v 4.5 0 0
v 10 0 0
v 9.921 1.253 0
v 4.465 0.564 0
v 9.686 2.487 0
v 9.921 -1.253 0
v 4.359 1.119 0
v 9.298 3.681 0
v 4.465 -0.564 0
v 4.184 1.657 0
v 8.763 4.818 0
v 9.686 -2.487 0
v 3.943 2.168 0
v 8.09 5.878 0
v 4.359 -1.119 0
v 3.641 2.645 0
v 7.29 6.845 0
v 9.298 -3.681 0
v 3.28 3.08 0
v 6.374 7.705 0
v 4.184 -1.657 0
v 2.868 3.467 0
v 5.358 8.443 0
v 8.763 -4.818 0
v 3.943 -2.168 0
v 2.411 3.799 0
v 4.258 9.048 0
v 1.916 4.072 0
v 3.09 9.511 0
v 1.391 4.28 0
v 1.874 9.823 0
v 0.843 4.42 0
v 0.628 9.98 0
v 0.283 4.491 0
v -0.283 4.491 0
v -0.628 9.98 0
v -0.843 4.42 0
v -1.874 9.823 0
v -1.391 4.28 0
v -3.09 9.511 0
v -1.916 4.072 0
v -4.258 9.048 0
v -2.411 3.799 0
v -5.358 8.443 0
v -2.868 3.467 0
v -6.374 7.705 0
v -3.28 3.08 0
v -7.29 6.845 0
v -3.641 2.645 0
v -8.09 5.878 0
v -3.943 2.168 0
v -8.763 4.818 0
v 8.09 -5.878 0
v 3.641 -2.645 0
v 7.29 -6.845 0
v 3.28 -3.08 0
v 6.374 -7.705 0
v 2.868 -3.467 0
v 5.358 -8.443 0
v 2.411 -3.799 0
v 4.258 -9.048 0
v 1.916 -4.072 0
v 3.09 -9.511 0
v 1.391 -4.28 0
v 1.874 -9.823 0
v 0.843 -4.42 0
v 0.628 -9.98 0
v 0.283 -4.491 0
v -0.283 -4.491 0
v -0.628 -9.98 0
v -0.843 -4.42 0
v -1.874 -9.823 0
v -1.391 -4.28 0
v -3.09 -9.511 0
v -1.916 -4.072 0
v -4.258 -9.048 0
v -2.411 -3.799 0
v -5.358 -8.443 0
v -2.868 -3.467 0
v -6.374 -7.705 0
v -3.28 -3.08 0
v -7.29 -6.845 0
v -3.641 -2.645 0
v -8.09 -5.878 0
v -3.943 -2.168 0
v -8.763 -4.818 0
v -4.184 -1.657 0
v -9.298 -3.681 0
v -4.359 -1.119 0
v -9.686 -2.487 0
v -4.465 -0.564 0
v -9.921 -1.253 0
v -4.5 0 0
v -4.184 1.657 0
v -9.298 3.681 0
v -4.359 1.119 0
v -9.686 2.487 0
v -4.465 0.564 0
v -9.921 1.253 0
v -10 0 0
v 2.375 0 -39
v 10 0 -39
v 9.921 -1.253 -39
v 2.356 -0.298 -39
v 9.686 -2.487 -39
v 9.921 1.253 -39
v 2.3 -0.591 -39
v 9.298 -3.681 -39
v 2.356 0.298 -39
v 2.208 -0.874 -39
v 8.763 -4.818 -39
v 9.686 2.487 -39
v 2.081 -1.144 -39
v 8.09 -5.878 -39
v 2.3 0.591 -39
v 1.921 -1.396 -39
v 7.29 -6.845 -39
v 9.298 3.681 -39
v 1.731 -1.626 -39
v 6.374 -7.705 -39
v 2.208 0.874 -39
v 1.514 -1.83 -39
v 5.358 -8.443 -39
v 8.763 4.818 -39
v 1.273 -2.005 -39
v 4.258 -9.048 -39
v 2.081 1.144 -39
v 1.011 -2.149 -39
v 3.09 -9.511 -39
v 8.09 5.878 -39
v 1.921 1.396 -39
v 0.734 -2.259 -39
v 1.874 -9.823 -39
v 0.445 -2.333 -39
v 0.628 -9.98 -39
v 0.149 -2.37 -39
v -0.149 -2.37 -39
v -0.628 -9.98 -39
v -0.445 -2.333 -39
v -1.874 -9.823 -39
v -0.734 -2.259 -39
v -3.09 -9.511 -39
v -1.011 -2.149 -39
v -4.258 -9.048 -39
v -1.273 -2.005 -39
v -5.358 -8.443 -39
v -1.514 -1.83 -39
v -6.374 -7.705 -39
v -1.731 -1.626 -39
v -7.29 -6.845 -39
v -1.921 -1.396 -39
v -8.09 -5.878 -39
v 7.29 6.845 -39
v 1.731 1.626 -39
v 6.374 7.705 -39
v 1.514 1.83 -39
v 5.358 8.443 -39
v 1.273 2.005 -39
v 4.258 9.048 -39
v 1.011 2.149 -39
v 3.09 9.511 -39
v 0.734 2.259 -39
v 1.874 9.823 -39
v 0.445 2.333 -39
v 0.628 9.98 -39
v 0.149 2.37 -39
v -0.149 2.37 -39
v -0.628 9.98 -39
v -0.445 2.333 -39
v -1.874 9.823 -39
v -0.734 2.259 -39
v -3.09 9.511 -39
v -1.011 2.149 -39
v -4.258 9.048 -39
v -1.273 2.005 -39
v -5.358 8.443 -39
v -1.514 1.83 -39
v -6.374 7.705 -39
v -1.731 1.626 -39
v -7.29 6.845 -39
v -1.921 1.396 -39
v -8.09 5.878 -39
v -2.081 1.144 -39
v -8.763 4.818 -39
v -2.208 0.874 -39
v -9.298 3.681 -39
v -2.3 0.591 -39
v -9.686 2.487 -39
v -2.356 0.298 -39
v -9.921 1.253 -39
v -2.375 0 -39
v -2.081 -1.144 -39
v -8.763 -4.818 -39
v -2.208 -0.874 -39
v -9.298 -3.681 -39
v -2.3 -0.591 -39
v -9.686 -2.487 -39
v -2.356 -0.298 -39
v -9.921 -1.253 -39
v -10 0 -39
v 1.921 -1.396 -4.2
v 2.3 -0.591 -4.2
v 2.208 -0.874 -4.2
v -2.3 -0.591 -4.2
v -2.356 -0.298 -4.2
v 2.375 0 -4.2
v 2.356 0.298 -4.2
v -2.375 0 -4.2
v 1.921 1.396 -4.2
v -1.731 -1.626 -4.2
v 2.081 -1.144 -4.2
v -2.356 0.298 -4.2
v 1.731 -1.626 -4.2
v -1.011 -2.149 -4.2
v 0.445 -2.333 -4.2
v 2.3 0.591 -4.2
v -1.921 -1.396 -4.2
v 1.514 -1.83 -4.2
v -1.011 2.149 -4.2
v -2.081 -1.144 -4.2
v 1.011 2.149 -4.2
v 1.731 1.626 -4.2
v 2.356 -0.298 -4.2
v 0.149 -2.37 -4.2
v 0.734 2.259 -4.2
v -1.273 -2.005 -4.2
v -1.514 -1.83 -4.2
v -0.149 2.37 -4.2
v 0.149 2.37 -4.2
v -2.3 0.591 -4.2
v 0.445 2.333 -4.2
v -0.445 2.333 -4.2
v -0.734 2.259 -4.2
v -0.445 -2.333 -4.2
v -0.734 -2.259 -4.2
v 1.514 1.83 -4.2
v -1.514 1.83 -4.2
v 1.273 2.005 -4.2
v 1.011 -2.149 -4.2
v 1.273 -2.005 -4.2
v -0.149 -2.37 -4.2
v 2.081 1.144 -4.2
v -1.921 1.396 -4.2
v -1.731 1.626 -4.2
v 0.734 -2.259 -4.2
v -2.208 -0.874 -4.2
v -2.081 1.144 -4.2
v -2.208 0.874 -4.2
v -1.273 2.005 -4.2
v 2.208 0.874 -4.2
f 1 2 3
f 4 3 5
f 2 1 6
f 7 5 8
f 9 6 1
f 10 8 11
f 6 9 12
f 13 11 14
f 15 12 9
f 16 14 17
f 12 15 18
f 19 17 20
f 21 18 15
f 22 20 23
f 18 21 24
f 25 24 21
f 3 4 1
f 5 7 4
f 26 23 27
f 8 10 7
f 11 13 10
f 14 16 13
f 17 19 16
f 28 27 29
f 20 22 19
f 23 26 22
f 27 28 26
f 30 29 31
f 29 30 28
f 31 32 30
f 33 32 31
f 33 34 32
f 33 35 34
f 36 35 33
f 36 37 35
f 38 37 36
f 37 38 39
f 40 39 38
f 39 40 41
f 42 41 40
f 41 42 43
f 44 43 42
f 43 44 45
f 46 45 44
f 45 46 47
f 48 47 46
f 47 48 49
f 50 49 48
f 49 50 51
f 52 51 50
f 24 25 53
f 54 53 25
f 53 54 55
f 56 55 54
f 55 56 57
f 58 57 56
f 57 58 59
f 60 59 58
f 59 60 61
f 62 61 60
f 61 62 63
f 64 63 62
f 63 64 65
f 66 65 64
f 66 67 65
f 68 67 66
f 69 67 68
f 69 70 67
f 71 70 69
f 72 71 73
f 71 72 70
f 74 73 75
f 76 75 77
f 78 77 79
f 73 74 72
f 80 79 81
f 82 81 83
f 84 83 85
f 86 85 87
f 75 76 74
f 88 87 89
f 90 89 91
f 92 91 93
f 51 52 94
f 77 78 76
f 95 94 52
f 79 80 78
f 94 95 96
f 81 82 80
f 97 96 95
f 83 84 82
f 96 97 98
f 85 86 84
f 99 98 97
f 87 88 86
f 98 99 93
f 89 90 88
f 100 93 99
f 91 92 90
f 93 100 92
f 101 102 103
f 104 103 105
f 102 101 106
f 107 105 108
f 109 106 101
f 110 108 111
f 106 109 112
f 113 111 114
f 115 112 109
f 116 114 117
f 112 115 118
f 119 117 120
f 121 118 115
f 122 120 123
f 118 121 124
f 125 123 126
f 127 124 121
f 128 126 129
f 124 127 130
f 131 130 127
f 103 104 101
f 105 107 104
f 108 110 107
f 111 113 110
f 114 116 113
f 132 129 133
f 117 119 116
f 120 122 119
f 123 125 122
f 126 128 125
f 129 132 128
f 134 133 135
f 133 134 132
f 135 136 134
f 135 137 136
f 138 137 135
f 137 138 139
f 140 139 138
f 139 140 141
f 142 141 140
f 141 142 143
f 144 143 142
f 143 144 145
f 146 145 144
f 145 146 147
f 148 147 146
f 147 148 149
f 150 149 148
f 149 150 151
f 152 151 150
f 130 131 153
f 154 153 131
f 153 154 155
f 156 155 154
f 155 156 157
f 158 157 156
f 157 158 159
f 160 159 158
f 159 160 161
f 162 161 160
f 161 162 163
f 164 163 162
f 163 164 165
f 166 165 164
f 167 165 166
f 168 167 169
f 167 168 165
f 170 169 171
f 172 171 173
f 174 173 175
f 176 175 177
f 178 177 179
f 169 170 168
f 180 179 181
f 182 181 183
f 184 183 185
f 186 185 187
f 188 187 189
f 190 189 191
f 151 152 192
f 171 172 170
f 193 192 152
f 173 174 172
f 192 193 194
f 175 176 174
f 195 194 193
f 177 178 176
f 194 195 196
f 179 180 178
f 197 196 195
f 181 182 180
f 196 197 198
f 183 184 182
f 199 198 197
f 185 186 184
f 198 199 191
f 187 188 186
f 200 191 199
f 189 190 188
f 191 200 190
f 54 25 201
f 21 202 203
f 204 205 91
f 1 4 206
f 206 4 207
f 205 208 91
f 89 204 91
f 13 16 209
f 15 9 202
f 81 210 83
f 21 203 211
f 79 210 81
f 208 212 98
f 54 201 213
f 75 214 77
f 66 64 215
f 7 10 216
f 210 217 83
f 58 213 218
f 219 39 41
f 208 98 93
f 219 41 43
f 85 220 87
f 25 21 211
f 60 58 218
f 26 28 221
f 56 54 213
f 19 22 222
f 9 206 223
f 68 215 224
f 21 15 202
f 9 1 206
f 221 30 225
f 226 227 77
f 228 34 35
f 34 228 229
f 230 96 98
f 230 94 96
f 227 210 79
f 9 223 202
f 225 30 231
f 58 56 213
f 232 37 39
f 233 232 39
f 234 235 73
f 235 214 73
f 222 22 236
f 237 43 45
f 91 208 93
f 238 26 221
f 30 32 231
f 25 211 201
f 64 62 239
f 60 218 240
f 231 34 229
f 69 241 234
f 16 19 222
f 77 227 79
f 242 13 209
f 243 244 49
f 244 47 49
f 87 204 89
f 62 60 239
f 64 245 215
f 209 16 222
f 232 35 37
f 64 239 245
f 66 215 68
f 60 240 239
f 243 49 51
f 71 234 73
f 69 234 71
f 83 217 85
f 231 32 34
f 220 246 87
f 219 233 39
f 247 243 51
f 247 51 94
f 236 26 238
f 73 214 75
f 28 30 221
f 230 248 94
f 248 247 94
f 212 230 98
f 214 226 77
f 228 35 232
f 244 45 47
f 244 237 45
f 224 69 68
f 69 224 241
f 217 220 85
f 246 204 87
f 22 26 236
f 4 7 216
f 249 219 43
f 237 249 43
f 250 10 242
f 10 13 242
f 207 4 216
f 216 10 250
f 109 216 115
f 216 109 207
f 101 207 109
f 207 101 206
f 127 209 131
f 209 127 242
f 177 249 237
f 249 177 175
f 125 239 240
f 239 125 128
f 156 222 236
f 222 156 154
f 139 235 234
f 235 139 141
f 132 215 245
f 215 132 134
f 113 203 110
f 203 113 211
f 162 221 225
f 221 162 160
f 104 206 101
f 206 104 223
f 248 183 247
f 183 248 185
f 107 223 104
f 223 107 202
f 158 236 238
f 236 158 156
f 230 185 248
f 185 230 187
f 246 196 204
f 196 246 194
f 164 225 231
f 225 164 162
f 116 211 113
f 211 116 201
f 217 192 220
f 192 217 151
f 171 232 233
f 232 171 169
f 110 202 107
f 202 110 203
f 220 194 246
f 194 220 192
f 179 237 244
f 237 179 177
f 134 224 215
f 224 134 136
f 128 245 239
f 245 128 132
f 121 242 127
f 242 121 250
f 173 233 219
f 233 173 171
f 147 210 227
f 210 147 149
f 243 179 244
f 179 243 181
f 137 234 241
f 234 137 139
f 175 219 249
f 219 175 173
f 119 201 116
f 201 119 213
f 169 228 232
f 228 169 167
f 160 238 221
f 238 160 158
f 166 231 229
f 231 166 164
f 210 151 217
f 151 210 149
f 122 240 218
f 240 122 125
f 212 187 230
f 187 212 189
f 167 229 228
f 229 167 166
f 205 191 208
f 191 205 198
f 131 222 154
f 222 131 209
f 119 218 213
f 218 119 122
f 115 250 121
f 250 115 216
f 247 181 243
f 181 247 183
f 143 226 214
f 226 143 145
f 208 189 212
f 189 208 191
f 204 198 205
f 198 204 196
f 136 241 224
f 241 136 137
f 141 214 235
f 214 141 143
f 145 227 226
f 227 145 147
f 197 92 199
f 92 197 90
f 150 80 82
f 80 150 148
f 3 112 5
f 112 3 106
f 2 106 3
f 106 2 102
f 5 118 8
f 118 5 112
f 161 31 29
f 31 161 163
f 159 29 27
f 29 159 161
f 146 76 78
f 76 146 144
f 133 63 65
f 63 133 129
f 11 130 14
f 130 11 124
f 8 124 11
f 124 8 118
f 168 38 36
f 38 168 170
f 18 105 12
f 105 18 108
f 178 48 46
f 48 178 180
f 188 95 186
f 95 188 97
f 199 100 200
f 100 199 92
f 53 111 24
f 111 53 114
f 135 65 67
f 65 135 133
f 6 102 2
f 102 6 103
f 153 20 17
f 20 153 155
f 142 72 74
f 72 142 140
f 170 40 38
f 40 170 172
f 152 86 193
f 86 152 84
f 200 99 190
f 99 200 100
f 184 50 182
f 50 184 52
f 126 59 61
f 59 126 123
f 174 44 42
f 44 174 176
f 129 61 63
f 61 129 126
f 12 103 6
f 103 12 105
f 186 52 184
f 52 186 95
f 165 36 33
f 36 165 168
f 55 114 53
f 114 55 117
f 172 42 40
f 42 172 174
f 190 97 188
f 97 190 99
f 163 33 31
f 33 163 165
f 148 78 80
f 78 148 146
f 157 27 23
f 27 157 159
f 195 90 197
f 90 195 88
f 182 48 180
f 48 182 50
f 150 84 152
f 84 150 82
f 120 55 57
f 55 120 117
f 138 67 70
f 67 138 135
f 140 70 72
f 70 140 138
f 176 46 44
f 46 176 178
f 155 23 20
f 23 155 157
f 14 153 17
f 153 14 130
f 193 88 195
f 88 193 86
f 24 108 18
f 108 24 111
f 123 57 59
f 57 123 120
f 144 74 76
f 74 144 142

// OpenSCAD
$fn = 50;


difference() {
	union() {
		translate(v = [0, 0, -39.0000000000]) {
			cylinder(h = 39, r = 10.0000000000);
		}
		cylinder(h = 0, r = 19.0000000000);
	}
	union() {
		translate(v = [0, 0, 0]) {
			rotate(a = [0, 0, 0]) {
				difference() {
					union() {
						#translate(v = [0, 0, -39.0000000000]) {
							cylinder(h = 39, r = 2.2500000000);
						}
						#translate(v = [0, 0, -4.2000000000]) {
							cylinder(h = 4.2000000000, r1 = 2.3750000000, r2 = 4.5000000000);
						}
						#translate(v = [0, 0, -39.0000000000]) {
							cylinder(h = 39, r = 2.3750000000);
						}
						#translate(v = [0, 0, -39.0000000000]) {
							cylinder(h = 39, r = 2.2500000000);
						}
					}
					union();
				}
			}
		}
	}
}
